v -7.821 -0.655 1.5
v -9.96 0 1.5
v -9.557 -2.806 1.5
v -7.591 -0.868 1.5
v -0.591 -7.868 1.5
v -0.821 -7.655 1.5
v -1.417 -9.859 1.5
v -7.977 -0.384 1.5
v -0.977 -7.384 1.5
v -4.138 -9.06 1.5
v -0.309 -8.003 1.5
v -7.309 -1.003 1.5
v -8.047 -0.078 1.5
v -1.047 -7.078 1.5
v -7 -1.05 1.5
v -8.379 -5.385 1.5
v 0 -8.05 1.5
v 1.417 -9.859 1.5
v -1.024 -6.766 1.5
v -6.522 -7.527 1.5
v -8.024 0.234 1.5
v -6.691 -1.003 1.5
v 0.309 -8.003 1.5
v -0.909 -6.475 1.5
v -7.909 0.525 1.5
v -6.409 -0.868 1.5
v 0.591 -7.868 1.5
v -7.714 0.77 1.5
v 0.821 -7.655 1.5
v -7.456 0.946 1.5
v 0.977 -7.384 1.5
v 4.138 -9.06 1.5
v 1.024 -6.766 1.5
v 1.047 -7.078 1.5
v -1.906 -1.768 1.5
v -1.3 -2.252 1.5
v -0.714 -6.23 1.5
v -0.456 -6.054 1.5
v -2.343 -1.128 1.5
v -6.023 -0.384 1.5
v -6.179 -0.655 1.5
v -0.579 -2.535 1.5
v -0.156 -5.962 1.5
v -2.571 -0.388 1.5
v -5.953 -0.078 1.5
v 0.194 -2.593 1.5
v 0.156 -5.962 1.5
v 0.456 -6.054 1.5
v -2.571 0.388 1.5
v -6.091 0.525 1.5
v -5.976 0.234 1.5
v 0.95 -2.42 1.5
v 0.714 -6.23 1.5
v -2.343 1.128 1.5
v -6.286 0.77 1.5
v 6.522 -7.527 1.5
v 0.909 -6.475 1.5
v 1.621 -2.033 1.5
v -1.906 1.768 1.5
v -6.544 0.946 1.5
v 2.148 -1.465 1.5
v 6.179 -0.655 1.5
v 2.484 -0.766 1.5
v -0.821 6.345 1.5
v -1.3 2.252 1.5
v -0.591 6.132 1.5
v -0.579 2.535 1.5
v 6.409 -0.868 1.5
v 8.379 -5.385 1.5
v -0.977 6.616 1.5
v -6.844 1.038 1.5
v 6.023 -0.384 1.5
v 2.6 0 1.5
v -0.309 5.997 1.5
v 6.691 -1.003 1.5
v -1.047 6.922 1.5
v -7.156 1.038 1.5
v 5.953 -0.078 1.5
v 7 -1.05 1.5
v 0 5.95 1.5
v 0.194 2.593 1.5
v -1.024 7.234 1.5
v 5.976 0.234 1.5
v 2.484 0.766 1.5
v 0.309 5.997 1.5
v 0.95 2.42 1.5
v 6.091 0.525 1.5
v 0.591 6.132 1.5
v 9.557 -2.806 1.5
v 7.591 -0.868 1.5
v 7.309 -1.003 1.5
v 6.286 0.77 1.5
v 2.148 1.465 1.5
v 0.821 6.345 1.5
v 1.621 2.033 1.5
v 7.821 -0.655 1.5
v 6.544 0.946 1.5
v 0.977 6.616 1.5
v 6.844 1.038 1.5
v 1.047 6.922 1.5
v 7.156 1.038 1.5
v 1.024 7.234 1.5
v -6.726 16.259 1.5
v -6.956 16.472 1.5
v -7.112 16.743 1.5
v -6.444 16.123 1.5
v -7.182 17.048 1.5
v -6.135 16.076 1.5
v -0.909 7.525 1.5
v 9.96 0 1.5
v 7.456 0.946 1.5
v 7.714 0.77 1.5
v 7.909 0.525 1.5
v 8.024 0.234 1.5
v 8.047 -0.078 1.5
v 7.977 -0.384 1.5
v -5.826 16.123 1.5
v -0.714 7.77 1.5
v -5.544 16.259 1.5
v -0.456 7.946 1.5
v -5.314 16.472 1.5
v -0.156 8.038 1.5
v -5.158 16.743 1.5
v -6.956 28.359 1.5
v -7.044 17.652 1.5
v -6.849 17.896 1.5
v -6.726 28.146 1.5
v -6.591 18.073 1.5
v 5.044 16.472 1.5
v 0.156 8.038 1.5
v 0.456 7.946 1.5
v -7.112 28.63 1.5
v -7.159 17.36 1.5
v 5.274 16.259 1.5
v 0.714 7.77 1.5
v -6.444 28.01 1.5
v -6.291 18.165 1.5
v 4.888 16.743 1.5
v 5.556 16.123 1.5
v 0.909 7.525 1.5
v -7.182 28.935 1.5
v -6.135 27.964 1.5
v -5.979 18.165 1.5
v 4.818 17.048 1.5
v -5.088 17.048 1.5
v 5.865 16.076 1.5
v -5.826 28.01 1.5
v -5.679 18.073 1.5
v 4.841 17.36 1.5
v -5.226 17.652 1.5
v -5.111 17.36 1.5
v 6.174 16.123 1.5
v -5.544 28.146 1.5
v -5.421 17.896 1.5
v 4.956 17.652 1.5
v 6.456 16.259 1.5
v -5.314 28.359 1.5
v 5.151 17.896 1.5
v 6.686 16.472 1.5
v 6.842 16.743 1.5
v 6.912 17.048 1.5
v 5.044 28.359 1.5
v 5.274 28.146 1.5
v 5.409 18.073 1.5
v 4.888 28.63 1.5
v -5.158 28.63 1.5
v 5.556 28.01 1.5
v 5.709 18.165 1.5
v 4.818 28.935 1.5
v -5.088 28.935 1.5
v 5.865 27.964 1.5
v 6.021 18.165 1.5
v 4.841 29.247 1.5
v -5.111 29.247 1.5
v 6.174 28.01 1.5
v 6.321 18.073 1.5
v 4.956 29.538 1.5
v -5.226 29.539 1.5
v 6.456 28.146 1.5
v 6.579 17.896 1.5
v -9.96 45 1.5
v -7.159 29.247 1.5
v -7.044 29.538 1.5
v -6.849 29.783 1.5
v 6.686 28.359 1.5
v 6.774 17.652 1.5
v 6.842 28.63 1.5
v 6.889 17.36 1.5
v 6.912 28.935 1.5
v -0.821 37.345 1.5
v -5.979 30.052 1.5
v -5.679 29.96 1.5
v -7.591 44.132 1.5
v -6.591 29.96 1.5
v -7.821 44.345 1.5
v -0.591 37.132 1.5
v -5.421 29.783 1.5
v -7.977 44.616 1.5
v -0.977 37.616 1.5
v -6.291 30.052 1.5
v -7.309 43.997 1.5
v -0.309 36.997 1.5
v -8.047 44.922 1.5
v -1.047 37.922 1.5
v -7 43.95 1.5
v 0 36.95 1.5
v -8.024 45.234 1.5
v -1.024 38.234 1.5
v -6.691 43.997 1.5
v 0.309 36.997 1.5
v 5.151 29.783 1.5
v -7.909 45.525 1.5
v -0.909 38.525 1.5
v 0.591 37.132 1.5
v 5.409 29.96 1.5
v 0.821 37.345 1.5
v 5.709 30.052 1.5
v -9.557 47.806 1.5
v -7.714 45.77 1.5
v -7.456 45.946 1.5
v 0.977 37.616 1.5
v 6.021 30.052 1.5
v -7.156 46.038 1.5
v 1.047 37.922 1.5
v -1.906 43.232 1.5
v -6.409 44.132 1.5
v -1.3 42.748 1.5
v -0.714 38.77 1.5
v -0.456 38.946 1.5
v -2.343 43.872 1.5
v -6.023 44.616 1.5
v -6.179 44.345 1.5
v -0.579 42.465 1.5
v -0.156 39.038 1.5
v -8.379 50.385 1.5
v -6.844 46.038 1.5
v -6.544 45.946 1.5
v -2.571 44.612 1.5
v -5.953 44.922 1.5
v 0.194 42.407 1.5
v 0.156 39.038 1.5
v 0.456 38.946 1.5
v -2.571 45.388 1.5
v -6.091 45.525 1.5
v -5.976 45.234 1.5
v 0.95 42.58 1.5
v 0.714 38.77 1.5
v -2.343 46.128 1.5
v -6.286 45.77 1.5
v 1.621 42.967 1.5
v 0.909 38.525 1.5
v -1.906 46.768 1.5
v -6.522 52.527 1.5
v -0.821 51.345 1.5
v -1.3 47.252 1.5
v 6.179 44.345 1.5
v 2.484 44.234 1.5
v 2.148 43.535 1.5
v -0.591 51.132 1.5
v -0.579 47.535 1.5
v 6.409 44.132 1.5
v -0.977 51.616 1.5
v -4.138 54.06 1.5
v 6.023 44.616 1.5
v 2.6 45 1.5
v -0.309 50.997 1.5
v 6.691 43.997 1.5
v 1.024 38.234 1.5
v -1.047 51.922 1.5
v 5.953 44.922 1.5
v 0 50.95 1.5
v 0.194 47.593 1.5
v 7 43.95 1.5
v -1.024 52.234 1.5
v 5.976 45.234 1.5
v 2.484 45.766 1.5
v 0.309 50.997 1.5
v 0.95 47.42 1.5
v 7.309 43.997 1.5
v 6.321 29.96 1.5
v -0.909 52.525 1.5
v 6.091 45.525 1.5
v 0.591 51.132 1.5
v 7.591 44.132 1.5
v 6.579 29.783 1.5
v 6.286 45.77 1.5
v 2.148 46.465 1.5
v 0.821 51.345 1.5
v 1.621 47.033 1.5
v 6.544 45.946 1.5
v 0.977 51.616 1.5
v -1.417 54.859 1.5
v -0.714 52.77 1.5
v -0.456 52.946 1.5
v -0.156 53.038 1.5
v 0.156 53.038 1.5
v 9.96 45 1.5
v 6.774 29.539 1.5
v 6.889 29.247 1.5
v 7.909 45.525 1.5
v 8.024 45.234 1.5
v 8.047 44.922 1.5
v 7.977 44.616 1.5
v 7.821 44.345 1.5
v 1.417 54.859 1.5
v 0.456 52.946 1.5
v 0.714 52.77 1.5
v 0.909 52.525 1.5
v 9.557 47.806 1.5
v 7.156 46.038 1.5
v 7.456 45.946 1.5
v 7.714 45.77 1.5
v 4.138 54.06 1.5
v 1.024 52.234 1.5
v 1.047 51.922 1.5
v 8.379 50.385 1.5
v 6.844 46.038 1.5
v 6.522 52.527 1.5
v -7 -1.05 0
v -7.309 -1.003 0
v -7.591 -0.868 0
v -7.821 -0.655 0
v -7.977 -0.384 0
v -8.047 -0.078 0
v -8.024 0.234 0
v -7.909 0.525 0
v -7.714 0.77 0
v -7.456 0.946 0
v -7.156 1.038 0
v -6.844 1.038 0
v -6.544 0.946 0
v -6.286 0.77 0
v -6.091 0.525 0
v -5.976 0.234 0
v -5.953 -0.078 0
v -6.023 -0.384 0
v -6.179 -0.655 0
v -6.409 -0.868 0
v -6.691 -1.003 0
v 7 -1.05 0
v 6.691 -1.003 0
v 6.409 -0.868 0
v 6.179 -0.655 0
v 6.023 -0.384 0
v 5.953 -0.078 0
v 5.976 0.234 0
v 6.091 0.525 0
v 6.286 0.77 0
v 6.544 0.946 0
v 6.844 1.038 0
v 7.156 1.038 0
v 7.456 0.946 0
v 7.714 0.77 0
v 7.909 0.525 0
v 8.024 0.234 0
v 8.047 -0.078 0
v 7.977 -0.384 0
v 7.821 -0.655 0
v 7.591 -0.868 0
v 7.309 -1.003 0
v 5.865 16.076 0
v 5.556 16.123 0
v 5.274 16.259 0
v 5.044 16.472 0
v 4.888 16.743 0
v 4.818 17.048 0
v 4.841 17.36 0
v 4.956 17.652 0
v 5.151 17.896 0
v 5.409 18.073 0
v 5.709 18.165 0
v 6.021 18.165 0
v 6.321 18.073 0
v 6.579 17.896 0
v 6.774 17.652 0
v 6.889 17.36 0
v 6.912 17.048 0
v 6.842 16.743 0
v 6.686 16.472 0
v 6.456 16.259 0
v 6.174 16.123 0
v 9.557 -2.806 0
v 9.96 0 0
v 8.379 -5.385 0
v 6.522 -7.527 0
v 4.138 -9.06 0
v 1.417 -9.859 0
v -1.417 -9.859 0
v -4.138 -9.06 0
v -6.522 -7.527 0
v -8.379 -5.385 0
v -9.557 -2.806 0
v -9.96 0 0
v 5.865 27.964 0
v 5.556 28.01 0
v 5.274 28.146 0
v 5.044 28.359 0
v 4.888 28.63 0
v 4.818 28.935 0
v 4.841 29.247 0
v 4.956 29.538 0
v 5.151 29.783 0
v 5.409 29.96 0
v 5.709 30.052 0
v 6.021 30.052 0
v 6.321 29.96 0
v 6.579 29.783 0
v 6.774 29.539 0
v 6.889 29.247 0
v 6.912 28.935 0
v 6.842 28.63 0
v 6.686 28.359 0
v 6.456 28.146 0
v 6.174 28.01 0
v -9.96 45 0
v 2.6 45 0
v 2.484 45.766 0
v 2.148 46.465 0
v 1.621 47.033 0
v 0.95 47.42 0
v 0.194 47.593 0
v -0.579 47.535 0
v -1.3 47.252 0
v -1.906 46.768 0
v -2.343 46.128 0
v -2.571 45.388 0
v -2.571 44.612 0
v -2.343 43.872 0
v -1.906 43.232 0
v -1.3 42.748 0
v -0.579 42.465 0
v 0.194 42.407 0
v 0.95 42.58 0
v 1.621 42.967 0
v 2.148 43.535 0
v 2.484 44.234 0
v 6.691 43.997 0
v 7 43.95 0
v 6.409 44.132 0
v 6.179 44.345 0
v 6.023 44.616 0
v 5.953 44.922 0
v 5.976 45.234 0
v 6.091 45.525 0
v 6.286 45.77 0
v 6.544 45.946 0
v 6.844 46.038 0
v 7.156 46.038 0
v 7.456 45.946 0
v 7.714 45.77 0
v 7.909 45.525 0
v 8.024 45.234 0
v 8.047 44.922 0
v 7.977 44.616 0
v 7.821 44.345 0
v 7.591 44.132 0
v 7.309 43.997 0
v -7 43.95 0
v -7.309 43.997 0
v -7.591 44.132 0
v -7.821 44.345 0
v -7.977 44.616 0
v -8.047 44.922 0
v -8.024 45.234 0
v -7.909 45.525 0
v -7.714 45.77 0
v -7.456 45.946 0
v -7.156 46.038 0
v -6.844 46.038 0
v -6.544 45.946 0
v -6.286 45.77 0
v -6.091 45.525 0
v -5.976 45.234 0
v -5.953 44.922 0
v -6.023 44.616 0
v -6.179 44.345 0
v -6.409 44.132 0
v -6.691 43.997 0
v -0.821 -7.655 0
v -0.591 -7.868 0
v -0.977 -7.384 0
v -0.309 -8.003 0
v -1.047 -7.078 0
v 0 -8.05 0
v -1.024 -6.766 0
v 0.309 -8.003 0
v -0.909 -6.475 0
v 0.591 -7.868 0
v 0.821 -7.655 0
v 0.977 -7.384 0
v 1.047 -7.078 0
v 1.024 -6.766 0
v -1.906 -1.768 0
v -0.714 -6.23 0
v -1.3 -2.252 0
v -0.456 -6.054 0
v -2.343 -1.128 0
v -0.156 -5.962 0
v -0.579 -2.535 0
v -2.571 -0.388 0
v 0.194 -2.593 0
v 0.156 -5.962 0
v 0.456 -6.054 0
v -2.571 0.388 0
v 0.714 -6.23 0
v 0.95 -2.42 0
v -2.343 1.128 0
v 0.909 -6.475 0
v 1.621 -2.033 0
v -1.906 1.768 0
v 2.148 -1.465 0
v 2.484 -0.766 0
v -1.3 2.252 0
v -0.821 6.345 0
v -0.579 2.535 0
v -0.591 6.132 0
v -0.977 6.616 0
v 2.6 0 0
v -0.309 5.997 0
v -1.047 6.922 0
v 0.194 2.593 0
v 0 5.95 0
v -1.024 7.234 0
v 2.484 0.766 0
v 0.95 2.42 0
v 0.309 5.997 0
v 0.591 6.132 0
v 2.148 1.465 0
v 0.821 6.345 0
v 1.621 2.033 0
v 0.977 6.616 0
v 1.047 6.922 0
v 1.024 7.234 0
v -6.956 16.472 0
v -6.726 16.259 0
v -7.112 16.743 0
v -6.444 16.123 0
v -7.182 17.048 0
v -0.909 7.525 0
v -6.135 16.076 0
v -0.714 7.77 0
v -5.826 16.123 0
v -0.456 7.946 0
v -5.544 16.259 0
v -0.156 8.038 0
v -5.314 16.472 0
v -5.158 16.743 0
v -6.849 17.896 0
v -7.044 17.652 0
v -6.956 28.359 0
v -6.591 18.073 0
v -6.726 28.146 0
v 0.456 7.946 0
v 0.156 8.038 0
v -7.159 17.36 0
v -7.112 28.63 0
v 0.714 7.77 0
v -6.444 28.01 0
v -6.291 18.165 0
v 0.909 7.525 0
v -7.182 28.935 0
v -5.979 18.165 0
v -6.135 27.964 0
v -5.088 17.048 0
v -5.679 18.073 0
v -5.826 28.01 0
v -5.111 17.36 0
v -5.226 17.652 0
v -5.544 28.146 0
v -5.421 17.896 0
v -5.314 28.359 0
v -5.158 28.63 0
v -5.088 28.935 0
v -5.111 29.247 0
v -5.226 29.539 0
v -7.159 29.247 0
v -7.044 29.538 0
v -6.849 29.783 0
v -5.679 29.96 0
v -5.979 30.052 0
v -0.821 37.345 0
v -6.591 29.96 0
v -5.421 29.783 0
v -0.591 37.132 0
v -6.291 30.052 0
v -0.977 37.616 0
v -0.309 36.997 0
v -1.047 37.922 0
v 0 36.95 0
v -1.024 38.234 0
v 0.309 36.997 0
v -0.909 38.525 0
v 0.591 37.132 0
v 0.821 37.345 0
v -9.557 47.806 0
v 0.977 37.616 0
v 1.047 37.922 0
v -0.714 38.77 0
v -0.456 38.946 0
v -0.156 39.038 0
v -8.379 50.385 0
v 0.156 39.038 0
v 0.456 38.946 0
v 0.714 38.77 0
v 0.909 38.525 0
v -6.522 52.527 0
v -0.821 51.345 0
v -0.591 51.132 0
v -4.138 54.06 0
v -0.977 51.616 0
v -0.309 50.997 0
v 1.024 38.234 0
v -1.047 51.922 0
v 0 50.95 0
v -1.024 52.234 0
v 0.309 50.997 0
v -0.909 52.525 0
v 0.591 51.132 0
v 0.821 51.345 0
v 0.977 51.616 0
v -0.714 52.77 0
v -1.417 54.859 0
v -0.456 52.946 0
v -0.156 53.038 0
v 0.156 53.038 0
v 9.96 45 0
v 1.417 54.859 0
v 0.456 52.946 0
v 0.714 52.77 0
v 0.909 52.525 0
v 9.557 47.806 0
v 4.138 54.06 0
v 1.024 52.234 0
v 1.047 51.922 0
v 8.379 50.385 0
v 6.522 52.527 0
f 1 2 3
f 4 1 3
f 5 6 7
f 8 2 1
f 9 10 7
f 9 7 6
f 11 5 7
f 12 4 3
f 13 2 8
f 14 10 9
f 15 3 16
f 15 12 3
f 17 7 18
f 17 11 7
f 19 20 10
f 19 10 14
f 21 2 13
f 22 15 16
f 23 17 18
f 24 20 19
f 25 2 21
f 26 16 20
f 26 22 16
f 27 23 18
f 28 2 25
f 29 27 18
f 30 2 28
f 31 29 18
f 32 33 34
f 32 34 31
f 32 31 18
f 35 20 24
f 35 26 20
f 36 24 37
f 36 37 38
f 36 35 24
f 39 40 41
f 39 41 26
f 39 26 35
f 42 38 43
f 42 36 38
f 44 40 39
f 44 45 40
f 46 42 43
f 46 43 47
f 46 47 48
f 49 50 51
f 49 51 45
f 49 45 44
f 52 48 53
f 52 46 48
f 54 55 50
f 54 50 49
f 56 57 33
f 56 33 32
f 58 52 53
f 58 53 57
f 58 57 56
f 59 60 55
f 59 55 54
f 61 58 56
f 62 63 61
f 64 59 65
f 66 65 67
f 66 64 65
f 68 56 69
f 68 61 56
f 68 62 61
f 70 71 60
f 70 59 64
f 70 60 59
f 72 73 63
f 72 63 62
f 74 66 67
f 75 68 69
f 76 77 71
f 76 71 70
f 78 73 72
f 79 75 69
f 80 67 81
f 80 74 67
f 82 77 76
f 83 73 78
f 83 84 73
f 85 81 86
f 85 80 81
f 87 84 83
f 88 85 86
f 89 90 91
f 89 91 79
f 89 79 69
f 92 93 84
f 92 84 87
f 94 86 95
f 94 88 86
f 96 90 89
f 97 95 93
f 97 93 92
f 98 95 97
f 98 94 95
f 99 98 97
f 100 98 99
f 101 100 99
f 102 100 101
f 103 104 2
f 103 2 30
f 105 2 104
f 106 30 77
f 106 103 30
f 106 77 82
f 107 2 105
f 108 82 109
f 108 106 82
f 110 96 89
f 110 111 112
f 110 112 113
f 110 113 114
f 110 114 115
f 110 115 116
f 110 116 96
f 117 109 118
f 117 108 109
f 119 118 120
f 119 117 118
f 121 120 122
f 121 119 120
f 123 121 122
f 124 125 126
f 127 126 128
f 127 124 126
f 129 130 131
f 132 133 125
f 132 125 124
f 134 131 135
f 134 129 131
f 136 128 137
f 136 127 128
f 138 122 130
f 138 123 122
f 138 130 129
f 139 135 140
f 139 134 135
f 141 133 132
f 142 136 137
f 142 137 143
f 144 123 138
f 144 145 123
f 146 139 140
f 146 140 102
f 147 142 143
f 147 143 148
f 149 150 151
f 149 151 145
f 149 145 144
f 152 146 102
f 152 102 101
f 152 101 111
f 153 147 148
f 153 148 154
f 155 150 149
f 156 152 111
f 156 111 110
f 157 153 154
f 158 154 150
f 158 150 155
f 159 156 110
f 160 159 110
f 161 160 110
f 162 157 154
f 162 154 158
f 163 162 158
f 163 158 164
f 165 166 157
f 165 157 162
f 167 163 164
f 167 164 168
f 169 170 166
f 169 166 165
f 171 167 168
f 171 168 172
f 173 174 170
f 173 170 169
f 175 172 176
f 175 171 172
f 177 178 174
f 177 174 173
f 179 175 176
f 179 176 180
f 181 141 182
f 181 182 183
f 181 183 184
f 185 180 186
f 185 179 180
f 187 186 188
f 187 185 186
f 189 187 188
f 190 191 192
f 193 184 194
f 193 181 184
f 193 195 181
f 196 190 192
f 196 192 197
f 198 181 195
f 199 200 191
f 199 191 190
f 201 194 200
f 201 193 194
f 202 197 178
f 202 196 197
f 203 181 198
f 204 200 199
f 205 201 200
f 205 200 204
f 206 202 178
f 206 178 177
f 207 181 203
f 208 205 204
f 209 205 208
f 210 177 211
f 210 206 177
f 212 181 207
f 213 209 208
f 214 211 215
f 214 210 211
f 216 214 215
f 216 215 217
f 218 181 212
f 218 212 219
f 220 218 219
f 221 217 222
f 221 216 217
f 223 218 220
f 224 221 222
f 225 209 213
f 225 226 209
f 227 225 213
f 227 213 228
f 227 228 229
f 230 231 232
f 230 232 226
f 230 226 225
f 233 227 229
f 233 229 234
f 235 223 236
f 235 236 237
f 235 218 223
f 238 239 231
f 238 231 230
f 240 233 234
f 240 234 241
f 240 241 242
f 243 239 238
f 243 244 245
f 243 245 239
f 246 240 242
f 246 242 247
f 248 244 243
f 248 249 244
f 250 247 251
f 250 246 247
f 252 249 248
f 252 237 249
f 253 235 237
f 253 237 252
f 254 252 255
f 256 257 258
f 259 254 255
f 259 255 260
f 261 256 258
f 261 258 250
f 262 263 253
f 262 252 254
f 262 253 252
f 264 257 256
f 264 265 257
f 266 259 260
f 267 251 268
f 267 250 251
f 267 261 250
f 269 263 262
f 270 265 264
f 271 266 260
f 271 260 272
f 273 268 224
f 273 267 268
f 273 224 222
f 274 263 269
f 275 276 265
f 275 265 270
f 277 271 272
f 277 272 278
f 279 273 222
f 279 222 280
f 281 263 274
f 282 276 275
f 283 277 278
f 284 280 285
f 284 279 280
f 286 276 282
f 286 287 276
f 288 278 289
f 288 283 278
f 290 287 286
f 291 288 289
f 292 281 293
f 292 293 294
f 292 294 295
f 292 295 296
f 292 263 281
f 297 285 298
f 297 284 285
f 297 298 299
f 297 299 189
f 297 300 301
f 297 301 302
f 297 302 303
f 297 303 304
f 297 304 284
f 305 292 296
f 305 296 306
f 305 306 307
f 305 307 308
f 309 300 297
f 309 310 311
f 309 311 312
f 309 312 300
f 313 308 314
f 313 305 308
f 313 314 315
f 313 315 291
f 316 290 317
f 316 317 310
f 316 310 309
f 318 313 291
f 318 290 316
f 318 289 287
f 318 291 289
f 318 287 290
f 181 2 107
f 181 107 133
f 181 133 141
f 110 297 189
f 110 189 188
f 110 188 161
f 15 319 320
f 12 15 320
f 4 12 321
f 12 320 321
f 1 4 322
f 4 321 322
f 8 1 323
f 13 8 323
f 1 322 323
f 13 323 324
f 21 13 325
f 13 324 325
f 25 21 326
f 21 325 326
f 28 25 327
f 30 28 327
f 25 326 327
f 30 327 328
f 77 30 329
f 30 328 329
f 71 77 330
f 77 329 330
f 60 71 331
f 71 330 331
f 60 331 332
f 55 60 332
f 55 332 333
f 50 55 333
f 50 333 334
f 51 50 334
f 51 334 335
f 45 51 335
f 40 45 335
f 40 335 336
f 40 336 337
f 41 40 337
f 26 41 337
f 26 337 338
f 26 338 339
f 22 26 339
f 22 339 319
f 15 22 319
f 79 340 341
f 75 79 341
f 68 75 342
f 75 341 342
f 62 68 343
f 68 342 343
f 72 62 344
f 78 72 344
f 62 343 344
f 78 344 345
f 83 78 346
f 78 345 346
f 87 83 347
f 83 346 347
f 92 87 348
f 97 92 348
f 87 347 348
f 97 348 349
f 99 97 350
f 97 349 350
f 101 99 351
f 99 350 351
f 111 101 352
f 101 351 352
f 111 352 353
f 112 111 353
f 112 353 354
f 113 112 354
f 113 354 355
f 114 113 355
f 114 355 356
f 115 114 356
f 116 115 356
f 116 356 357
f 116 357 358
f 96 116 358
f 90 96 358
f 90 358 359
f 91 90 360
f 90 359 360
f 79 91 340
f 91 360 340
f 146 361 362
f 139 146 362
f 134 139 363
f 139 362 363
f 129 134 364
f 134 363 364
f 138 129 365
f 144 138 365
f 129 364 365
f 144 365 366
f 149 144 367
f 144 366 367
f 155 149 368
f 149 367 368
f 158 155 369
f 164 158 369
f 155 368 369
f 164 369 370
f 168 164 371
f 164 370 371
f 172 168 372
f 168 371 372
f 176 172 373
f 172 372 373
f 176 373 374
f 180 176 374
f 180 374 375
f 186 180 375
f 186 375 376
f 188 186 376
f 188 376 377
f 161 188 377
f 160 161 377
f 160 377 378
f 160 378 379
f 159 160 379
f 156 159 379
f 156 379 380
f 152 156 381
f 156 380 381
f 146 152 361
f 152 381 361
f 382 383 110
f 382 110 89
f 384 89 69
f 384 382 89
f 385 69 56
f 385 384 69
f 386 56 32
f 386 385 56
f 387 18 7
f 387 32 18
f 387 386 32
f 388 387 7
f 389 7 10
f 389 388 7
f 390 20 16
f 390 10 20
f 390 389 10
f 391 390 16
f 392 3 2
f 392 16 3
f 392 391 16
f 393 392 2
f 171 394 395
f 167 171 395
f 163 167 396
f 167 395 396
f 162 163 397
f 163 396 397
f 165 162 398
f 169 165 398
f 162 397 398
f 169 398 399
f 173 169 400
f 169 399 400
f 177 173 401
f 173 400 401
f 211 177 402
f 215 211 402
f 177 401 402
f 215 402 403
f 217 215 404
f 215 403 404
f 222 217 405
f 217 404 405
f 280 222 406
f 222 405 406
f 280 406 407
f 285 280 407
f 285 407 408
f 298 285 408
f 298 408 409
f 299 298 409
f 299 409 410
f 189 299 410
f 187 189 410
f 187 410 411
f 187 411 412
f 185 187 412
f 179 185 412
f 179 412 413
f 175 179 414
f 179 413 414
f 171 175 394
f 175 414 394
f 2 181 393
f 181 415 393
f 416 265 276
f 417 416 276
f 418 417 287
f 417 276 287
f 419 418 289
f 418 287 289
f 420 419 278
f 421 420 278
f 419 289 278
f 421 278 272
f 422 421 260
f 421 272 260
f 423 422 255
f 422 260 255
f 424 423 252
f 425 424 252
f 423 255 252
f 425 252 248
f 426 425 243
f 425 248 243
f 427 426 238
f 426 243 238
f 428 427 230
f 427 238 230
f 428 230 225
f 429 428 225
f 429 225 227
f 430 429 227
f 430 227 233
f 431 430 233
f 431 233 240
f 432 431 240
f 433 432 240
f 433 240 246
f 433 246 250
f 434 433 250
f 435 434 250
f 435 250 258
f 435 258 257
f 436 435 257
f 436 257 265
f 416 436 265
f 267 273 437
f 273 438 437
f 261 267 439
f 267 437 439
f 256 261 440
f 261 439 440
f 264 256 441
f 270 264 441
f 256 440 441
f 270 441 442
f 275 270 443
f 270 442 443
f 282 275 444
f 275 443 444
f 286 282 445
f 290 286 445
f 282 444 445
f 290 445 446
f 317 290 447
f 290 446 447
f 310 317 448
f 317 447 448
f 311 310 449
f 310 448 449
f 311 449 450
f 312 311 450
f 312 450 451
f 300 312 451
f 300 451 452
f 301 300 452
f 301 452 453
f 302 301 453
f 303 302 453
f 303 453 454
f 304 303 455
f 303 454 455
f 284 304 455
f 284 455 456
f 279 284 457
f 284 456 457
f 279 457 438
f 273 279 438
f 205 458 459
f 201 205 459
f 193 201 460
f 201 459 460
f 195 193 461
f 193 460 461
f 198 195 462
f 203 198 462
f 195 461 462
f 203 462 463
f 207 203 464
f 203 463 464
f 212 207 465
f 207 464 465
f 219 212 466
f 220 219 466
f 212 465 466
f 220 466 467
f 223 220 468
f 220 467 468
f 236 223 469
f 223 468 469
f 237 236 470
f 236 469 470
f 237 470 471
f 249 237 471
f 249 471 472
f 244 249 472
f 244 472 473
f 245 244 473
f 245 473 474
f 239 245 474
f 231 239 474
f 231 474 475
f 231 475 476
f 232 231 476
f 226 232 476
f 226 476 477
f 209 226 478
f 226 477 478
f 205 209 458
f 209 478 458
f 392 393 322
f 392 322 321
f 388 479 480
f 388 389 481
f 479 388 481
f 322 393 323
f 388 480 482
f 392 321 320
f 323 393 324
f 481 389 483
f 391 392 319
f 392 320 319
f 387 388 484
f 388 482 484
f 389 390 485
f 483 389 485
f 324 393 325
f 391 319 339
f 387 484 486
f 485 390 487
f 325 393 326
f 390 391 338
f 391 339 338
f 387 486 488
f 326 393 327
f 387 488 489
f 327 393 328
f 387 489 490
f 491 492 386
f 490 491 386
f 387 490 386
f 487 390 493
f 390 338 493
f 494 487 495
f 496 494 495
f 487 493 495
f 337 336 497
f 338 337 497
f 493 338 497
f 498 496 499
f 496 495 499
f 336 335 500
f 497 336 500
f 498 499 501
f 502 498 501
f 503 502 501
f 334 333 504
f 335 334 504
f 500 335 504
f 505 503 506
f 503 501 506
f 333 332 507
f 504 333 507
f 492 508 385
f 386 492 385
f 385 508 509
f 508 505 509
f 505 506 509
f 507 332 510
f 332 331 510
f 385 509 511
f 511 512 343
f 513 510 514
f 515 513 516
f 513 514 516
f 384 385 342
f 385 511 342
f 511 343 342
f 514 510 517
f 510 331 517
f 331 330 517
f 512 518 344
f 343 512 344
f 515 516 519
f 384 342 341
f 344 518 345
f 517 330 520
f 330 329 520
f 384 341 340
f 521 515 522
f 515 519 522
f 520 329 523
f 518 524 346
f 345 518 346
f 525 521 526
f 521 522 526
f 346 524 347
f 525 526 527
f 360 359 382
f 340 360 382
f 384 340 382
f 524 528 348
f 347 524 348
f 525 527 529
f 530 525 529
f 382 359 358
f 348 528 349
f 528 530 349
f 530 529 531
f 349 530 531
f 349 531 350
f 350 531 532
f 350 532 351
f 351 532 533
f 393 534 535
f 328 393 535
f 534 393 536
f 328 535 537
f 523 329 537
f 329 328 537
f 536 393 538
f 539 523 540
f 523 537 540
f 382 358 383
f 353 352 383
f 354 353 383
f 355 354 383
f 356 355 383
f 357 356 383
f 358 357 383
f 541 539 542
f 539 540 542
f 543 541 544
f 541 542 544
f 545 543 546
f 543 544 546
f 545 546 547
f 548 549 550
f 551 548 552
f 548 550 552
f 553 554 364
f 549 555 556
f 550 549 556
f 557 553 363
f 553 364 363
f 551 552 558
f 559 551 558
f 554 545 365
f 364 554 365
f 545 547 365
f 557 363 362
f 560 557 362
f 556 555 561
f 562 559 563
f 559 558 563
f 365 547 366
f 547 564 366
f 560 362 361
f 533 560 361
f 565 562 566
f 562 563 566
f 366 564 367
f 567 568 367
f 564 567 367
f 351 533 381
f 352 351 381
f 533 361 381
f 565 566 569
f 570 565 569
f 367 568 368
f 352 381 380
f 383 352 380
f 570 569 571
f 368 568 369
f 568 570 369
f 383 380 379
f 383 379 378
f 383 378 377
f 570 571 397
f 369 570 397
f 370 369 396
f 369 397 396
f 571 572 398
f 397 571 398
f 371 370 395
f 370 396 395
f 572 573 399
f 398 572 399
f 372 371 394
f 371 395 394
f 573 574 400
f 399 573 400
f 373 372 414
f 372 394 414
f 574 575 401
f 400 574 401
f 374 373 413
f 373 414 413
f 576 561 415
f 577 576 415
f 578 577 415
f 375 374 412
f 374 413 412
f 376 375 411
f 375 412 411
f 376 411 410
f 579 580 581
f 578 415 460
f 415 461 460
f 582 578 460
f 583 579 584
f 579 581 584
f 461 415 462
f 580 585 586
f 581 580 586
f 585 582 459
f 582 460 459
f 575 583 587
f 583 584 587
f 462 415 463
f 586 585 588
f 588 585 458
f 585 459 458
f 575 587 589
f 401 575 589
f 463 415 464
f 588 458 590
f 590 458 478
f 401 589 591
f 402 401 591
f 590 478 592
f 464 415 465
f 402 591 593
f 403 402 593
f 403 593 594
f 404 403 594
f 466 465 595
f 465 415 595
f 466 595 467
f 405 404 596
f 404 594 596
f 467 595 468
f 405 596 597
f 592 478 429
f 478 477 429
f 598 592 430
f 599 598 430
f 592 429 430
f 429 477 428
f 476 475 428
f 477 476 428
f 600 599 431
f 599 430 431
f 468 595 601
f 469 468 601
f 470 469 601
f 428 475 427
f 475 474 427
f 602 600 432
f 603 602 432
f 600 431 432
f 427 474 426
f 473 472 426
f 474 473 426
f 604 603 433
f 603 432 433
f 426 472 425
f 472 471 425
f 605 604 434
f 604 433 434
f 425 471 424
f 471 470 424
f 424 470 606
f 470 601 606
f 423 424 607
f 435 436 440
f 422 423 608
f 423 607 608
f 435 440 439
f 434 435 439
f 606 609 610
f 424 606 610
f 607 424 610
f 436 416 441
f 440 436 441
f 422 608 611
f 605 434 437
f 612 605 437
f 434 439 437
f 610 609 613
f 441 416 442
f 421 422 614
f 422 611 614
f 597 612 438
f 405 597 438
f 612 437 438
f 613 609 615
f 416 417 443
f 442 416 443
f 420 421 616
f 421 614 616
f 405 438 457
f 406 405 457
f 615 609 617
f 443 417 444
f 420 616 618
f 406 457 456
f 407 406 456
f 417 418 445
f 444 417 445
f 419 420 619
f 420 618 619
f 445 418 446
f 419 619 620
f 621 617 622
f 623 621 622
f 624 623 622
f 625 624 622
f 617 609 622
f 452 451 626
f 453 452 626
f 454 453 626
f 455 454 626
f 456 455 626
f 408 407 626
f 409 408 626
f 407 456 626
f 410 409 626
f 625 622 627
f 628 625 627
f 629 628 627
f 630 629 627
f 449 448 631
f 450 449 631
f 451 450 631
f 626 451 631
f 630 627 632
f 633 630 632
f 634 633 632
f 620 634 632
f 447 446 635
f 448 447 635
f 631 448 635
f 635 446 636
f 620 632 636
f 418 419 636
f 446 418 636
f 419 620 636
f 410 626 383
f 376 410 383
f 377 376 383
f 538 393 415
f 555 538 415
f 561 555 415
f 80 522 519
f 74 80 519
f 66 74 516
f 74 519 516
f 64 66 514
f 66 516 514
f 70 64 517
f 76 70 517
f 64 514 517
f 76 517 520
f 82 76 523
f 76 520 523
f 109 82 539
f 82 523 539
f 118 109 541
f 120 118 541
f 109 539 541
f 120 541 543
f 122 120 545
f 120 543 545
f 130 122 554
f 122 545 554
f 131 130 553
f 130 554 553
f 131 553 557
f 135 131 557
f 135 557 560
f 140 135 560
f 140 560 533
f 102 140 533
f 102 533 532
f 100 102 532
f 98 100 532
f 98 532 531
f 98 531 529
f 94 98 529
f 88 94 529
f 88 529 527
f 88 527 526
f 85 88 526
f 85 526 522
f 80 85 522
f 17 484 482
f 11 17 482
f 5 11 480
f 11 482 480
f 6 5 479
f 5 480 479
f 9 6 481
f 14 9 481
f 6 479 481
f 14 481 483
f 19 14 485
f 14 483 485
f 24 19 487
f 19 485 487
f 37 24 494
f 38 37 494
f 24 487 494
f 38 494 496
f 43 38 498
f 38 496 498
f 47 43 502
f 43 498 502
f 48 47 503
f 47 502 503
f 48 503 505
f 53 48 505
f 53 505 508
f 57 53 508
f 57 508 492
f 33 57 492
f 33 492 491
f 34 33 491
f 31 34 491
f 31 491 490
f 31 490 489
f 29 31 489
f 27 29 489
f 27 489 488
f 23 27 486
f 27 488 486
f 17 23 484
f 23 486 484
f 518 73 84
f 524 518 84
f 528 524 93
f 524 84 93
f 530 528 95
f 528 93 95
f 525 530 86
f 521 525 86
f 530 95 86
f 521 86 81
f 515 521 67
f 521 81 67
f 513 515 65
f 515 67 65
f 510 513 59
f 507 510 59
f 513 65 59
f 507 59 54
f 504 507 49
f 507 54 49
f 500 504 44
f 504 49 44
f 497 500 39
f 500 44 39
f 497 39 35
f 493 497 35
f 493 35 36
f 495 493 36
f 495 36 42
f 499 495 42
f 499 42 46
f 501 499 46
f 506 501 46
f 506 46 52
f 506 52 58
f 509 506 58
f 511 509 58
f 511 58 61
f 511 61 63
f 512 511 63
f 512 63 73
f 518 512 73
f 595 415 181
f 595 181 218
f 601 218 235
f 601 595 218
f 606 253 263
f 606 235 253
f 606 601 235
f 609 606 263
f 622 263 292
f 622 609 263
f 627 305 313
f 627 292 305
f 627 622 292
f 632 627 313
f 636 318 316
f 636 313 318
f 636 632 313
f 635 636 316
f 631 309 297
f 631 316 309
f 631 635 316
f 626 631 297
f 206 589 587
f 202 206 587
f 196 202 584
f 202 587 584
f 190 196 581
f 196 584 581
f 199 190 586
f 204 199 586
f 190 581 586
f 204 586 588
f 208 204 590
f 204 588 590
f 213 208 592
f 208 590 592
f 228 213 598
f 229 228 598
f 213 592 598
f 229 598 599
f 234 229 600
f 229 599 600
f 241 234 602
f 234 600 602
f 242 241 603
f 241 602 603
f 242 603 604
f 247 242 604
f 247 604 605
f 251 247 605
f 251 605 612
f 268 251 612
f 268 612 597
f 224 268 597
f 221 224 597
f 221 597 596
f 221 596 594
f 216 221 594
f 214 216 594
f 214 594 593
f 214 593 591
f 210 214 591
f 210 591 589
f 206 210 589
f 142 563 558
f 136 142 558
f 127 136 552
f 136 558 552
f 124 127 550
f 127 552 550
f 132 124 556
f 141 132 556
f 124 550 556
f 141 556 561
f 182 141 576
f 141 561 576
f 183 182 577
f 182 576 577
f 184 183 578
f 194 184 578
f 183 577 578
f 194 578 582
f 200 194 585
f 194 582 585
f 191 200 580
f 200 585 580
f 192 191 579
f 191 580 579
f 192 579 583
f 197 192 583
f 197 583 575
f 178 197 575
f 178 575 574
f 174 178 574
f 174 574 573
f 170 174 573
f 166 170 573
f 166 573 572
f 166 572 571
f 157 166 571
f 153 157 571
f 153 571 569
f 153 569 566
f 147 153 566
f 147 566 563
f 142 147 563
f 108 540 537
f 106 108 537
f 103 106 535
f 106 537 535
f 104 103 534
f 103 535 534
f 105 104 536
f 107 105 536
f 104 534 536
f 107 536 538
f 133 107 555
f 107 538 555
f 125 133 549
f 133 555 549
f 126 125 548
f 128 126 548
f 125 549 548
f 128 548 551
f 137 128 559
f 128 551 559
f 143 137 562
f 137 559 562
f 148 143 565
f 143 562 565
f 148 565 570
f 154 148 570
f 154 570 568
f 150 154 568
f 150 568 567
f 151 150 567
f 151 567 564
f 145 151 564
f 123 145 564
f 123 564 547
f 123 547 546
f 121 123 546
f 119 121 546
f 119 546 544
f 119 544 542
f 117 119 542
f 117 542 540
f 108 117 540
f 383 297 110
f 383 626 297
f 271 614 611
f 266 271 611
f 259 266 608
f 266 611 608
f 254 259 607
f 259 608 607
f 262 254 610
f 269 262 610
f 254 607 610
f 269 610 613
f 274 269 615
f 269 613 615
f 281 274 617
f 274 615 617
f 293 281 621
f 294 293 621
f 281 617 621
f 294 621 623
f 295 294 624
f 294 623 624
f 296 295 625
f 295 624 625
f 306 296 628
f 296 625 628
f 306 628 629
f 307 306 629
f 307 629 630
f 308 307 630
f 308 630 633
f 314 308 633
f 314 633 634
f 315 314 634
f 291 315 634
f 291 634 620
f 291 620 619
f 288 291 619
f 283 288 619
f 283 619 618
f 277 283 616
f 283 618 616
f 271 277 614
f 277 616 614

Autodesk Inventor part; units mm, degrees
ref_plane "YZ Plane" through (0, 0, 0) normal (1, 0, 0) x (0, 1, 0)
ref_plane "XZ Plane" through (0, 0, 0) normal (0, 1, 0) x (-1, 0, 0)
ref_plane "XY Plane" through (0, 0, 0) normal (0, 0, 1) x (1, 0, 0)
sketch "Sketch1" plane through (0, 0, 0) normal (0, 0, 1) x (1, 0, 0)
  circle A0 centre (0, 0) radius 9.96
  circle A1 centre (0, 45) radius 9.96
  line L0 (-9.96, 45) -> (-9.96, 0)
  line L1 (9.96, 45) -> (9.96, 0)
  dimension "d0" = 19.92
  dimension "d1" = 45
extrude "Plate1" add sketch "Sketch1" along normal blind 1.5
sketch "Sketch2" plane through (0, 0, 1.5) normal (0, 0, 1) x (1, 0, 0)
  circle A0 centre (-7, 0) radius 0.7835 projected
  circle A1 centre (7, 0) radius 0.7835 projected
  circle A2 centre (0, 7) radius 0.7835 projected
  circle A3 centre (0, -7) radius 0.7835 projected
  line L0 (-9.96, 0) -> (-9.96, 45) construction
  line L1 (9.96, 45) -> (9.96, 0) construction
  line L2 (-9.96, 22.5) -> (9.96, 22.5) construction
  point P0 (0, 0)
  point P1 (-7, 45)
  point P2 (7, 45)
  point P3 (0, 38)
  point P4 (0, 52)
hole "Hole1" at (0, 52, 1.5) at (-7, 45, 1.5) at (0, 38, 1.5) at (7, 45, 1.5) at (0, 7, 1.5) at (-7, 0, 1.5) at (0, -7, 1.5) at (7, 0, 1.5) direction (0, 0, -1) diameter 2.1 end through all
sketch "Sketch3" plane through (0, 0, 1.5) normal (0, 0, 1) x (1, 0, 0)
  circle A0 centre (0, 0) radius 1.75 projected
  circle A1 centre (0, 0) radius 2.6
  line L0 (-9.96, 0) -> (-9.96, 45) construction
  line L1 (9.96, 45) -> (9.96, 0) construction
  line L2 (-9.96, 22.5) -> (9.96, 22.5) construction
  circle A2 centre (0, 45) radius 2.6
  point P0 (0, 0)
  dimension "d10" = 5.2
extrude "Extrusion1" cut sketch "Sketch3" against normal through all contours A0 | A1 | A2
sketch "Sketch4" plane through (0, 0, 1.5) normal (0, 0, 1) x (1, 0, 0)
  circle A0 centre (5.865, 29.0135) radius 0.7835 projected
  circle A1 centre (-6.135, 29.0135) radius 0.7835 projected
  circle A2 centre (5.865, 17.1265) radius 0.7835 projected
  circle A3 centre (-6.135, 17.1265) radius 0.7835 projected
  point P0 (0, 0)
hole "Hole2" at (-6.135, 29.0135, 1.5) at (5.865, 29.0135, 1.5) at (-6.135, 17.1265, 1.5) at (5.865, 17.1265, 1.5) direction (0, 0, -1) diameter 2.1 end through all
equation "\"d8\" = Thickness"
equation "\"d18\" = Thickness"
equation "\"d2\" = Thickness"
equation "\"BendReliefWidth\" = Thickness"
equation "\"BendReliefDepth\" = 0.5 * Thickness"
equation "\"CornerReliefSize\" = 4 * Thickness"
equation "\"MinimumRemnant\" = 2 * Thickness"
equation "\"TransitionRadius\" = BendRadius"
equation "\"JacobiRadiusSize\" = BendRadius"
equation "\"GapSize\" = Thickness"
equation "\"Thickness\" = 1.5"
equation "\"BendRadius\" = 0.31"
properties part number "axis_3_bottom_frame(top)" material "Aluminum 6061-AHC"
